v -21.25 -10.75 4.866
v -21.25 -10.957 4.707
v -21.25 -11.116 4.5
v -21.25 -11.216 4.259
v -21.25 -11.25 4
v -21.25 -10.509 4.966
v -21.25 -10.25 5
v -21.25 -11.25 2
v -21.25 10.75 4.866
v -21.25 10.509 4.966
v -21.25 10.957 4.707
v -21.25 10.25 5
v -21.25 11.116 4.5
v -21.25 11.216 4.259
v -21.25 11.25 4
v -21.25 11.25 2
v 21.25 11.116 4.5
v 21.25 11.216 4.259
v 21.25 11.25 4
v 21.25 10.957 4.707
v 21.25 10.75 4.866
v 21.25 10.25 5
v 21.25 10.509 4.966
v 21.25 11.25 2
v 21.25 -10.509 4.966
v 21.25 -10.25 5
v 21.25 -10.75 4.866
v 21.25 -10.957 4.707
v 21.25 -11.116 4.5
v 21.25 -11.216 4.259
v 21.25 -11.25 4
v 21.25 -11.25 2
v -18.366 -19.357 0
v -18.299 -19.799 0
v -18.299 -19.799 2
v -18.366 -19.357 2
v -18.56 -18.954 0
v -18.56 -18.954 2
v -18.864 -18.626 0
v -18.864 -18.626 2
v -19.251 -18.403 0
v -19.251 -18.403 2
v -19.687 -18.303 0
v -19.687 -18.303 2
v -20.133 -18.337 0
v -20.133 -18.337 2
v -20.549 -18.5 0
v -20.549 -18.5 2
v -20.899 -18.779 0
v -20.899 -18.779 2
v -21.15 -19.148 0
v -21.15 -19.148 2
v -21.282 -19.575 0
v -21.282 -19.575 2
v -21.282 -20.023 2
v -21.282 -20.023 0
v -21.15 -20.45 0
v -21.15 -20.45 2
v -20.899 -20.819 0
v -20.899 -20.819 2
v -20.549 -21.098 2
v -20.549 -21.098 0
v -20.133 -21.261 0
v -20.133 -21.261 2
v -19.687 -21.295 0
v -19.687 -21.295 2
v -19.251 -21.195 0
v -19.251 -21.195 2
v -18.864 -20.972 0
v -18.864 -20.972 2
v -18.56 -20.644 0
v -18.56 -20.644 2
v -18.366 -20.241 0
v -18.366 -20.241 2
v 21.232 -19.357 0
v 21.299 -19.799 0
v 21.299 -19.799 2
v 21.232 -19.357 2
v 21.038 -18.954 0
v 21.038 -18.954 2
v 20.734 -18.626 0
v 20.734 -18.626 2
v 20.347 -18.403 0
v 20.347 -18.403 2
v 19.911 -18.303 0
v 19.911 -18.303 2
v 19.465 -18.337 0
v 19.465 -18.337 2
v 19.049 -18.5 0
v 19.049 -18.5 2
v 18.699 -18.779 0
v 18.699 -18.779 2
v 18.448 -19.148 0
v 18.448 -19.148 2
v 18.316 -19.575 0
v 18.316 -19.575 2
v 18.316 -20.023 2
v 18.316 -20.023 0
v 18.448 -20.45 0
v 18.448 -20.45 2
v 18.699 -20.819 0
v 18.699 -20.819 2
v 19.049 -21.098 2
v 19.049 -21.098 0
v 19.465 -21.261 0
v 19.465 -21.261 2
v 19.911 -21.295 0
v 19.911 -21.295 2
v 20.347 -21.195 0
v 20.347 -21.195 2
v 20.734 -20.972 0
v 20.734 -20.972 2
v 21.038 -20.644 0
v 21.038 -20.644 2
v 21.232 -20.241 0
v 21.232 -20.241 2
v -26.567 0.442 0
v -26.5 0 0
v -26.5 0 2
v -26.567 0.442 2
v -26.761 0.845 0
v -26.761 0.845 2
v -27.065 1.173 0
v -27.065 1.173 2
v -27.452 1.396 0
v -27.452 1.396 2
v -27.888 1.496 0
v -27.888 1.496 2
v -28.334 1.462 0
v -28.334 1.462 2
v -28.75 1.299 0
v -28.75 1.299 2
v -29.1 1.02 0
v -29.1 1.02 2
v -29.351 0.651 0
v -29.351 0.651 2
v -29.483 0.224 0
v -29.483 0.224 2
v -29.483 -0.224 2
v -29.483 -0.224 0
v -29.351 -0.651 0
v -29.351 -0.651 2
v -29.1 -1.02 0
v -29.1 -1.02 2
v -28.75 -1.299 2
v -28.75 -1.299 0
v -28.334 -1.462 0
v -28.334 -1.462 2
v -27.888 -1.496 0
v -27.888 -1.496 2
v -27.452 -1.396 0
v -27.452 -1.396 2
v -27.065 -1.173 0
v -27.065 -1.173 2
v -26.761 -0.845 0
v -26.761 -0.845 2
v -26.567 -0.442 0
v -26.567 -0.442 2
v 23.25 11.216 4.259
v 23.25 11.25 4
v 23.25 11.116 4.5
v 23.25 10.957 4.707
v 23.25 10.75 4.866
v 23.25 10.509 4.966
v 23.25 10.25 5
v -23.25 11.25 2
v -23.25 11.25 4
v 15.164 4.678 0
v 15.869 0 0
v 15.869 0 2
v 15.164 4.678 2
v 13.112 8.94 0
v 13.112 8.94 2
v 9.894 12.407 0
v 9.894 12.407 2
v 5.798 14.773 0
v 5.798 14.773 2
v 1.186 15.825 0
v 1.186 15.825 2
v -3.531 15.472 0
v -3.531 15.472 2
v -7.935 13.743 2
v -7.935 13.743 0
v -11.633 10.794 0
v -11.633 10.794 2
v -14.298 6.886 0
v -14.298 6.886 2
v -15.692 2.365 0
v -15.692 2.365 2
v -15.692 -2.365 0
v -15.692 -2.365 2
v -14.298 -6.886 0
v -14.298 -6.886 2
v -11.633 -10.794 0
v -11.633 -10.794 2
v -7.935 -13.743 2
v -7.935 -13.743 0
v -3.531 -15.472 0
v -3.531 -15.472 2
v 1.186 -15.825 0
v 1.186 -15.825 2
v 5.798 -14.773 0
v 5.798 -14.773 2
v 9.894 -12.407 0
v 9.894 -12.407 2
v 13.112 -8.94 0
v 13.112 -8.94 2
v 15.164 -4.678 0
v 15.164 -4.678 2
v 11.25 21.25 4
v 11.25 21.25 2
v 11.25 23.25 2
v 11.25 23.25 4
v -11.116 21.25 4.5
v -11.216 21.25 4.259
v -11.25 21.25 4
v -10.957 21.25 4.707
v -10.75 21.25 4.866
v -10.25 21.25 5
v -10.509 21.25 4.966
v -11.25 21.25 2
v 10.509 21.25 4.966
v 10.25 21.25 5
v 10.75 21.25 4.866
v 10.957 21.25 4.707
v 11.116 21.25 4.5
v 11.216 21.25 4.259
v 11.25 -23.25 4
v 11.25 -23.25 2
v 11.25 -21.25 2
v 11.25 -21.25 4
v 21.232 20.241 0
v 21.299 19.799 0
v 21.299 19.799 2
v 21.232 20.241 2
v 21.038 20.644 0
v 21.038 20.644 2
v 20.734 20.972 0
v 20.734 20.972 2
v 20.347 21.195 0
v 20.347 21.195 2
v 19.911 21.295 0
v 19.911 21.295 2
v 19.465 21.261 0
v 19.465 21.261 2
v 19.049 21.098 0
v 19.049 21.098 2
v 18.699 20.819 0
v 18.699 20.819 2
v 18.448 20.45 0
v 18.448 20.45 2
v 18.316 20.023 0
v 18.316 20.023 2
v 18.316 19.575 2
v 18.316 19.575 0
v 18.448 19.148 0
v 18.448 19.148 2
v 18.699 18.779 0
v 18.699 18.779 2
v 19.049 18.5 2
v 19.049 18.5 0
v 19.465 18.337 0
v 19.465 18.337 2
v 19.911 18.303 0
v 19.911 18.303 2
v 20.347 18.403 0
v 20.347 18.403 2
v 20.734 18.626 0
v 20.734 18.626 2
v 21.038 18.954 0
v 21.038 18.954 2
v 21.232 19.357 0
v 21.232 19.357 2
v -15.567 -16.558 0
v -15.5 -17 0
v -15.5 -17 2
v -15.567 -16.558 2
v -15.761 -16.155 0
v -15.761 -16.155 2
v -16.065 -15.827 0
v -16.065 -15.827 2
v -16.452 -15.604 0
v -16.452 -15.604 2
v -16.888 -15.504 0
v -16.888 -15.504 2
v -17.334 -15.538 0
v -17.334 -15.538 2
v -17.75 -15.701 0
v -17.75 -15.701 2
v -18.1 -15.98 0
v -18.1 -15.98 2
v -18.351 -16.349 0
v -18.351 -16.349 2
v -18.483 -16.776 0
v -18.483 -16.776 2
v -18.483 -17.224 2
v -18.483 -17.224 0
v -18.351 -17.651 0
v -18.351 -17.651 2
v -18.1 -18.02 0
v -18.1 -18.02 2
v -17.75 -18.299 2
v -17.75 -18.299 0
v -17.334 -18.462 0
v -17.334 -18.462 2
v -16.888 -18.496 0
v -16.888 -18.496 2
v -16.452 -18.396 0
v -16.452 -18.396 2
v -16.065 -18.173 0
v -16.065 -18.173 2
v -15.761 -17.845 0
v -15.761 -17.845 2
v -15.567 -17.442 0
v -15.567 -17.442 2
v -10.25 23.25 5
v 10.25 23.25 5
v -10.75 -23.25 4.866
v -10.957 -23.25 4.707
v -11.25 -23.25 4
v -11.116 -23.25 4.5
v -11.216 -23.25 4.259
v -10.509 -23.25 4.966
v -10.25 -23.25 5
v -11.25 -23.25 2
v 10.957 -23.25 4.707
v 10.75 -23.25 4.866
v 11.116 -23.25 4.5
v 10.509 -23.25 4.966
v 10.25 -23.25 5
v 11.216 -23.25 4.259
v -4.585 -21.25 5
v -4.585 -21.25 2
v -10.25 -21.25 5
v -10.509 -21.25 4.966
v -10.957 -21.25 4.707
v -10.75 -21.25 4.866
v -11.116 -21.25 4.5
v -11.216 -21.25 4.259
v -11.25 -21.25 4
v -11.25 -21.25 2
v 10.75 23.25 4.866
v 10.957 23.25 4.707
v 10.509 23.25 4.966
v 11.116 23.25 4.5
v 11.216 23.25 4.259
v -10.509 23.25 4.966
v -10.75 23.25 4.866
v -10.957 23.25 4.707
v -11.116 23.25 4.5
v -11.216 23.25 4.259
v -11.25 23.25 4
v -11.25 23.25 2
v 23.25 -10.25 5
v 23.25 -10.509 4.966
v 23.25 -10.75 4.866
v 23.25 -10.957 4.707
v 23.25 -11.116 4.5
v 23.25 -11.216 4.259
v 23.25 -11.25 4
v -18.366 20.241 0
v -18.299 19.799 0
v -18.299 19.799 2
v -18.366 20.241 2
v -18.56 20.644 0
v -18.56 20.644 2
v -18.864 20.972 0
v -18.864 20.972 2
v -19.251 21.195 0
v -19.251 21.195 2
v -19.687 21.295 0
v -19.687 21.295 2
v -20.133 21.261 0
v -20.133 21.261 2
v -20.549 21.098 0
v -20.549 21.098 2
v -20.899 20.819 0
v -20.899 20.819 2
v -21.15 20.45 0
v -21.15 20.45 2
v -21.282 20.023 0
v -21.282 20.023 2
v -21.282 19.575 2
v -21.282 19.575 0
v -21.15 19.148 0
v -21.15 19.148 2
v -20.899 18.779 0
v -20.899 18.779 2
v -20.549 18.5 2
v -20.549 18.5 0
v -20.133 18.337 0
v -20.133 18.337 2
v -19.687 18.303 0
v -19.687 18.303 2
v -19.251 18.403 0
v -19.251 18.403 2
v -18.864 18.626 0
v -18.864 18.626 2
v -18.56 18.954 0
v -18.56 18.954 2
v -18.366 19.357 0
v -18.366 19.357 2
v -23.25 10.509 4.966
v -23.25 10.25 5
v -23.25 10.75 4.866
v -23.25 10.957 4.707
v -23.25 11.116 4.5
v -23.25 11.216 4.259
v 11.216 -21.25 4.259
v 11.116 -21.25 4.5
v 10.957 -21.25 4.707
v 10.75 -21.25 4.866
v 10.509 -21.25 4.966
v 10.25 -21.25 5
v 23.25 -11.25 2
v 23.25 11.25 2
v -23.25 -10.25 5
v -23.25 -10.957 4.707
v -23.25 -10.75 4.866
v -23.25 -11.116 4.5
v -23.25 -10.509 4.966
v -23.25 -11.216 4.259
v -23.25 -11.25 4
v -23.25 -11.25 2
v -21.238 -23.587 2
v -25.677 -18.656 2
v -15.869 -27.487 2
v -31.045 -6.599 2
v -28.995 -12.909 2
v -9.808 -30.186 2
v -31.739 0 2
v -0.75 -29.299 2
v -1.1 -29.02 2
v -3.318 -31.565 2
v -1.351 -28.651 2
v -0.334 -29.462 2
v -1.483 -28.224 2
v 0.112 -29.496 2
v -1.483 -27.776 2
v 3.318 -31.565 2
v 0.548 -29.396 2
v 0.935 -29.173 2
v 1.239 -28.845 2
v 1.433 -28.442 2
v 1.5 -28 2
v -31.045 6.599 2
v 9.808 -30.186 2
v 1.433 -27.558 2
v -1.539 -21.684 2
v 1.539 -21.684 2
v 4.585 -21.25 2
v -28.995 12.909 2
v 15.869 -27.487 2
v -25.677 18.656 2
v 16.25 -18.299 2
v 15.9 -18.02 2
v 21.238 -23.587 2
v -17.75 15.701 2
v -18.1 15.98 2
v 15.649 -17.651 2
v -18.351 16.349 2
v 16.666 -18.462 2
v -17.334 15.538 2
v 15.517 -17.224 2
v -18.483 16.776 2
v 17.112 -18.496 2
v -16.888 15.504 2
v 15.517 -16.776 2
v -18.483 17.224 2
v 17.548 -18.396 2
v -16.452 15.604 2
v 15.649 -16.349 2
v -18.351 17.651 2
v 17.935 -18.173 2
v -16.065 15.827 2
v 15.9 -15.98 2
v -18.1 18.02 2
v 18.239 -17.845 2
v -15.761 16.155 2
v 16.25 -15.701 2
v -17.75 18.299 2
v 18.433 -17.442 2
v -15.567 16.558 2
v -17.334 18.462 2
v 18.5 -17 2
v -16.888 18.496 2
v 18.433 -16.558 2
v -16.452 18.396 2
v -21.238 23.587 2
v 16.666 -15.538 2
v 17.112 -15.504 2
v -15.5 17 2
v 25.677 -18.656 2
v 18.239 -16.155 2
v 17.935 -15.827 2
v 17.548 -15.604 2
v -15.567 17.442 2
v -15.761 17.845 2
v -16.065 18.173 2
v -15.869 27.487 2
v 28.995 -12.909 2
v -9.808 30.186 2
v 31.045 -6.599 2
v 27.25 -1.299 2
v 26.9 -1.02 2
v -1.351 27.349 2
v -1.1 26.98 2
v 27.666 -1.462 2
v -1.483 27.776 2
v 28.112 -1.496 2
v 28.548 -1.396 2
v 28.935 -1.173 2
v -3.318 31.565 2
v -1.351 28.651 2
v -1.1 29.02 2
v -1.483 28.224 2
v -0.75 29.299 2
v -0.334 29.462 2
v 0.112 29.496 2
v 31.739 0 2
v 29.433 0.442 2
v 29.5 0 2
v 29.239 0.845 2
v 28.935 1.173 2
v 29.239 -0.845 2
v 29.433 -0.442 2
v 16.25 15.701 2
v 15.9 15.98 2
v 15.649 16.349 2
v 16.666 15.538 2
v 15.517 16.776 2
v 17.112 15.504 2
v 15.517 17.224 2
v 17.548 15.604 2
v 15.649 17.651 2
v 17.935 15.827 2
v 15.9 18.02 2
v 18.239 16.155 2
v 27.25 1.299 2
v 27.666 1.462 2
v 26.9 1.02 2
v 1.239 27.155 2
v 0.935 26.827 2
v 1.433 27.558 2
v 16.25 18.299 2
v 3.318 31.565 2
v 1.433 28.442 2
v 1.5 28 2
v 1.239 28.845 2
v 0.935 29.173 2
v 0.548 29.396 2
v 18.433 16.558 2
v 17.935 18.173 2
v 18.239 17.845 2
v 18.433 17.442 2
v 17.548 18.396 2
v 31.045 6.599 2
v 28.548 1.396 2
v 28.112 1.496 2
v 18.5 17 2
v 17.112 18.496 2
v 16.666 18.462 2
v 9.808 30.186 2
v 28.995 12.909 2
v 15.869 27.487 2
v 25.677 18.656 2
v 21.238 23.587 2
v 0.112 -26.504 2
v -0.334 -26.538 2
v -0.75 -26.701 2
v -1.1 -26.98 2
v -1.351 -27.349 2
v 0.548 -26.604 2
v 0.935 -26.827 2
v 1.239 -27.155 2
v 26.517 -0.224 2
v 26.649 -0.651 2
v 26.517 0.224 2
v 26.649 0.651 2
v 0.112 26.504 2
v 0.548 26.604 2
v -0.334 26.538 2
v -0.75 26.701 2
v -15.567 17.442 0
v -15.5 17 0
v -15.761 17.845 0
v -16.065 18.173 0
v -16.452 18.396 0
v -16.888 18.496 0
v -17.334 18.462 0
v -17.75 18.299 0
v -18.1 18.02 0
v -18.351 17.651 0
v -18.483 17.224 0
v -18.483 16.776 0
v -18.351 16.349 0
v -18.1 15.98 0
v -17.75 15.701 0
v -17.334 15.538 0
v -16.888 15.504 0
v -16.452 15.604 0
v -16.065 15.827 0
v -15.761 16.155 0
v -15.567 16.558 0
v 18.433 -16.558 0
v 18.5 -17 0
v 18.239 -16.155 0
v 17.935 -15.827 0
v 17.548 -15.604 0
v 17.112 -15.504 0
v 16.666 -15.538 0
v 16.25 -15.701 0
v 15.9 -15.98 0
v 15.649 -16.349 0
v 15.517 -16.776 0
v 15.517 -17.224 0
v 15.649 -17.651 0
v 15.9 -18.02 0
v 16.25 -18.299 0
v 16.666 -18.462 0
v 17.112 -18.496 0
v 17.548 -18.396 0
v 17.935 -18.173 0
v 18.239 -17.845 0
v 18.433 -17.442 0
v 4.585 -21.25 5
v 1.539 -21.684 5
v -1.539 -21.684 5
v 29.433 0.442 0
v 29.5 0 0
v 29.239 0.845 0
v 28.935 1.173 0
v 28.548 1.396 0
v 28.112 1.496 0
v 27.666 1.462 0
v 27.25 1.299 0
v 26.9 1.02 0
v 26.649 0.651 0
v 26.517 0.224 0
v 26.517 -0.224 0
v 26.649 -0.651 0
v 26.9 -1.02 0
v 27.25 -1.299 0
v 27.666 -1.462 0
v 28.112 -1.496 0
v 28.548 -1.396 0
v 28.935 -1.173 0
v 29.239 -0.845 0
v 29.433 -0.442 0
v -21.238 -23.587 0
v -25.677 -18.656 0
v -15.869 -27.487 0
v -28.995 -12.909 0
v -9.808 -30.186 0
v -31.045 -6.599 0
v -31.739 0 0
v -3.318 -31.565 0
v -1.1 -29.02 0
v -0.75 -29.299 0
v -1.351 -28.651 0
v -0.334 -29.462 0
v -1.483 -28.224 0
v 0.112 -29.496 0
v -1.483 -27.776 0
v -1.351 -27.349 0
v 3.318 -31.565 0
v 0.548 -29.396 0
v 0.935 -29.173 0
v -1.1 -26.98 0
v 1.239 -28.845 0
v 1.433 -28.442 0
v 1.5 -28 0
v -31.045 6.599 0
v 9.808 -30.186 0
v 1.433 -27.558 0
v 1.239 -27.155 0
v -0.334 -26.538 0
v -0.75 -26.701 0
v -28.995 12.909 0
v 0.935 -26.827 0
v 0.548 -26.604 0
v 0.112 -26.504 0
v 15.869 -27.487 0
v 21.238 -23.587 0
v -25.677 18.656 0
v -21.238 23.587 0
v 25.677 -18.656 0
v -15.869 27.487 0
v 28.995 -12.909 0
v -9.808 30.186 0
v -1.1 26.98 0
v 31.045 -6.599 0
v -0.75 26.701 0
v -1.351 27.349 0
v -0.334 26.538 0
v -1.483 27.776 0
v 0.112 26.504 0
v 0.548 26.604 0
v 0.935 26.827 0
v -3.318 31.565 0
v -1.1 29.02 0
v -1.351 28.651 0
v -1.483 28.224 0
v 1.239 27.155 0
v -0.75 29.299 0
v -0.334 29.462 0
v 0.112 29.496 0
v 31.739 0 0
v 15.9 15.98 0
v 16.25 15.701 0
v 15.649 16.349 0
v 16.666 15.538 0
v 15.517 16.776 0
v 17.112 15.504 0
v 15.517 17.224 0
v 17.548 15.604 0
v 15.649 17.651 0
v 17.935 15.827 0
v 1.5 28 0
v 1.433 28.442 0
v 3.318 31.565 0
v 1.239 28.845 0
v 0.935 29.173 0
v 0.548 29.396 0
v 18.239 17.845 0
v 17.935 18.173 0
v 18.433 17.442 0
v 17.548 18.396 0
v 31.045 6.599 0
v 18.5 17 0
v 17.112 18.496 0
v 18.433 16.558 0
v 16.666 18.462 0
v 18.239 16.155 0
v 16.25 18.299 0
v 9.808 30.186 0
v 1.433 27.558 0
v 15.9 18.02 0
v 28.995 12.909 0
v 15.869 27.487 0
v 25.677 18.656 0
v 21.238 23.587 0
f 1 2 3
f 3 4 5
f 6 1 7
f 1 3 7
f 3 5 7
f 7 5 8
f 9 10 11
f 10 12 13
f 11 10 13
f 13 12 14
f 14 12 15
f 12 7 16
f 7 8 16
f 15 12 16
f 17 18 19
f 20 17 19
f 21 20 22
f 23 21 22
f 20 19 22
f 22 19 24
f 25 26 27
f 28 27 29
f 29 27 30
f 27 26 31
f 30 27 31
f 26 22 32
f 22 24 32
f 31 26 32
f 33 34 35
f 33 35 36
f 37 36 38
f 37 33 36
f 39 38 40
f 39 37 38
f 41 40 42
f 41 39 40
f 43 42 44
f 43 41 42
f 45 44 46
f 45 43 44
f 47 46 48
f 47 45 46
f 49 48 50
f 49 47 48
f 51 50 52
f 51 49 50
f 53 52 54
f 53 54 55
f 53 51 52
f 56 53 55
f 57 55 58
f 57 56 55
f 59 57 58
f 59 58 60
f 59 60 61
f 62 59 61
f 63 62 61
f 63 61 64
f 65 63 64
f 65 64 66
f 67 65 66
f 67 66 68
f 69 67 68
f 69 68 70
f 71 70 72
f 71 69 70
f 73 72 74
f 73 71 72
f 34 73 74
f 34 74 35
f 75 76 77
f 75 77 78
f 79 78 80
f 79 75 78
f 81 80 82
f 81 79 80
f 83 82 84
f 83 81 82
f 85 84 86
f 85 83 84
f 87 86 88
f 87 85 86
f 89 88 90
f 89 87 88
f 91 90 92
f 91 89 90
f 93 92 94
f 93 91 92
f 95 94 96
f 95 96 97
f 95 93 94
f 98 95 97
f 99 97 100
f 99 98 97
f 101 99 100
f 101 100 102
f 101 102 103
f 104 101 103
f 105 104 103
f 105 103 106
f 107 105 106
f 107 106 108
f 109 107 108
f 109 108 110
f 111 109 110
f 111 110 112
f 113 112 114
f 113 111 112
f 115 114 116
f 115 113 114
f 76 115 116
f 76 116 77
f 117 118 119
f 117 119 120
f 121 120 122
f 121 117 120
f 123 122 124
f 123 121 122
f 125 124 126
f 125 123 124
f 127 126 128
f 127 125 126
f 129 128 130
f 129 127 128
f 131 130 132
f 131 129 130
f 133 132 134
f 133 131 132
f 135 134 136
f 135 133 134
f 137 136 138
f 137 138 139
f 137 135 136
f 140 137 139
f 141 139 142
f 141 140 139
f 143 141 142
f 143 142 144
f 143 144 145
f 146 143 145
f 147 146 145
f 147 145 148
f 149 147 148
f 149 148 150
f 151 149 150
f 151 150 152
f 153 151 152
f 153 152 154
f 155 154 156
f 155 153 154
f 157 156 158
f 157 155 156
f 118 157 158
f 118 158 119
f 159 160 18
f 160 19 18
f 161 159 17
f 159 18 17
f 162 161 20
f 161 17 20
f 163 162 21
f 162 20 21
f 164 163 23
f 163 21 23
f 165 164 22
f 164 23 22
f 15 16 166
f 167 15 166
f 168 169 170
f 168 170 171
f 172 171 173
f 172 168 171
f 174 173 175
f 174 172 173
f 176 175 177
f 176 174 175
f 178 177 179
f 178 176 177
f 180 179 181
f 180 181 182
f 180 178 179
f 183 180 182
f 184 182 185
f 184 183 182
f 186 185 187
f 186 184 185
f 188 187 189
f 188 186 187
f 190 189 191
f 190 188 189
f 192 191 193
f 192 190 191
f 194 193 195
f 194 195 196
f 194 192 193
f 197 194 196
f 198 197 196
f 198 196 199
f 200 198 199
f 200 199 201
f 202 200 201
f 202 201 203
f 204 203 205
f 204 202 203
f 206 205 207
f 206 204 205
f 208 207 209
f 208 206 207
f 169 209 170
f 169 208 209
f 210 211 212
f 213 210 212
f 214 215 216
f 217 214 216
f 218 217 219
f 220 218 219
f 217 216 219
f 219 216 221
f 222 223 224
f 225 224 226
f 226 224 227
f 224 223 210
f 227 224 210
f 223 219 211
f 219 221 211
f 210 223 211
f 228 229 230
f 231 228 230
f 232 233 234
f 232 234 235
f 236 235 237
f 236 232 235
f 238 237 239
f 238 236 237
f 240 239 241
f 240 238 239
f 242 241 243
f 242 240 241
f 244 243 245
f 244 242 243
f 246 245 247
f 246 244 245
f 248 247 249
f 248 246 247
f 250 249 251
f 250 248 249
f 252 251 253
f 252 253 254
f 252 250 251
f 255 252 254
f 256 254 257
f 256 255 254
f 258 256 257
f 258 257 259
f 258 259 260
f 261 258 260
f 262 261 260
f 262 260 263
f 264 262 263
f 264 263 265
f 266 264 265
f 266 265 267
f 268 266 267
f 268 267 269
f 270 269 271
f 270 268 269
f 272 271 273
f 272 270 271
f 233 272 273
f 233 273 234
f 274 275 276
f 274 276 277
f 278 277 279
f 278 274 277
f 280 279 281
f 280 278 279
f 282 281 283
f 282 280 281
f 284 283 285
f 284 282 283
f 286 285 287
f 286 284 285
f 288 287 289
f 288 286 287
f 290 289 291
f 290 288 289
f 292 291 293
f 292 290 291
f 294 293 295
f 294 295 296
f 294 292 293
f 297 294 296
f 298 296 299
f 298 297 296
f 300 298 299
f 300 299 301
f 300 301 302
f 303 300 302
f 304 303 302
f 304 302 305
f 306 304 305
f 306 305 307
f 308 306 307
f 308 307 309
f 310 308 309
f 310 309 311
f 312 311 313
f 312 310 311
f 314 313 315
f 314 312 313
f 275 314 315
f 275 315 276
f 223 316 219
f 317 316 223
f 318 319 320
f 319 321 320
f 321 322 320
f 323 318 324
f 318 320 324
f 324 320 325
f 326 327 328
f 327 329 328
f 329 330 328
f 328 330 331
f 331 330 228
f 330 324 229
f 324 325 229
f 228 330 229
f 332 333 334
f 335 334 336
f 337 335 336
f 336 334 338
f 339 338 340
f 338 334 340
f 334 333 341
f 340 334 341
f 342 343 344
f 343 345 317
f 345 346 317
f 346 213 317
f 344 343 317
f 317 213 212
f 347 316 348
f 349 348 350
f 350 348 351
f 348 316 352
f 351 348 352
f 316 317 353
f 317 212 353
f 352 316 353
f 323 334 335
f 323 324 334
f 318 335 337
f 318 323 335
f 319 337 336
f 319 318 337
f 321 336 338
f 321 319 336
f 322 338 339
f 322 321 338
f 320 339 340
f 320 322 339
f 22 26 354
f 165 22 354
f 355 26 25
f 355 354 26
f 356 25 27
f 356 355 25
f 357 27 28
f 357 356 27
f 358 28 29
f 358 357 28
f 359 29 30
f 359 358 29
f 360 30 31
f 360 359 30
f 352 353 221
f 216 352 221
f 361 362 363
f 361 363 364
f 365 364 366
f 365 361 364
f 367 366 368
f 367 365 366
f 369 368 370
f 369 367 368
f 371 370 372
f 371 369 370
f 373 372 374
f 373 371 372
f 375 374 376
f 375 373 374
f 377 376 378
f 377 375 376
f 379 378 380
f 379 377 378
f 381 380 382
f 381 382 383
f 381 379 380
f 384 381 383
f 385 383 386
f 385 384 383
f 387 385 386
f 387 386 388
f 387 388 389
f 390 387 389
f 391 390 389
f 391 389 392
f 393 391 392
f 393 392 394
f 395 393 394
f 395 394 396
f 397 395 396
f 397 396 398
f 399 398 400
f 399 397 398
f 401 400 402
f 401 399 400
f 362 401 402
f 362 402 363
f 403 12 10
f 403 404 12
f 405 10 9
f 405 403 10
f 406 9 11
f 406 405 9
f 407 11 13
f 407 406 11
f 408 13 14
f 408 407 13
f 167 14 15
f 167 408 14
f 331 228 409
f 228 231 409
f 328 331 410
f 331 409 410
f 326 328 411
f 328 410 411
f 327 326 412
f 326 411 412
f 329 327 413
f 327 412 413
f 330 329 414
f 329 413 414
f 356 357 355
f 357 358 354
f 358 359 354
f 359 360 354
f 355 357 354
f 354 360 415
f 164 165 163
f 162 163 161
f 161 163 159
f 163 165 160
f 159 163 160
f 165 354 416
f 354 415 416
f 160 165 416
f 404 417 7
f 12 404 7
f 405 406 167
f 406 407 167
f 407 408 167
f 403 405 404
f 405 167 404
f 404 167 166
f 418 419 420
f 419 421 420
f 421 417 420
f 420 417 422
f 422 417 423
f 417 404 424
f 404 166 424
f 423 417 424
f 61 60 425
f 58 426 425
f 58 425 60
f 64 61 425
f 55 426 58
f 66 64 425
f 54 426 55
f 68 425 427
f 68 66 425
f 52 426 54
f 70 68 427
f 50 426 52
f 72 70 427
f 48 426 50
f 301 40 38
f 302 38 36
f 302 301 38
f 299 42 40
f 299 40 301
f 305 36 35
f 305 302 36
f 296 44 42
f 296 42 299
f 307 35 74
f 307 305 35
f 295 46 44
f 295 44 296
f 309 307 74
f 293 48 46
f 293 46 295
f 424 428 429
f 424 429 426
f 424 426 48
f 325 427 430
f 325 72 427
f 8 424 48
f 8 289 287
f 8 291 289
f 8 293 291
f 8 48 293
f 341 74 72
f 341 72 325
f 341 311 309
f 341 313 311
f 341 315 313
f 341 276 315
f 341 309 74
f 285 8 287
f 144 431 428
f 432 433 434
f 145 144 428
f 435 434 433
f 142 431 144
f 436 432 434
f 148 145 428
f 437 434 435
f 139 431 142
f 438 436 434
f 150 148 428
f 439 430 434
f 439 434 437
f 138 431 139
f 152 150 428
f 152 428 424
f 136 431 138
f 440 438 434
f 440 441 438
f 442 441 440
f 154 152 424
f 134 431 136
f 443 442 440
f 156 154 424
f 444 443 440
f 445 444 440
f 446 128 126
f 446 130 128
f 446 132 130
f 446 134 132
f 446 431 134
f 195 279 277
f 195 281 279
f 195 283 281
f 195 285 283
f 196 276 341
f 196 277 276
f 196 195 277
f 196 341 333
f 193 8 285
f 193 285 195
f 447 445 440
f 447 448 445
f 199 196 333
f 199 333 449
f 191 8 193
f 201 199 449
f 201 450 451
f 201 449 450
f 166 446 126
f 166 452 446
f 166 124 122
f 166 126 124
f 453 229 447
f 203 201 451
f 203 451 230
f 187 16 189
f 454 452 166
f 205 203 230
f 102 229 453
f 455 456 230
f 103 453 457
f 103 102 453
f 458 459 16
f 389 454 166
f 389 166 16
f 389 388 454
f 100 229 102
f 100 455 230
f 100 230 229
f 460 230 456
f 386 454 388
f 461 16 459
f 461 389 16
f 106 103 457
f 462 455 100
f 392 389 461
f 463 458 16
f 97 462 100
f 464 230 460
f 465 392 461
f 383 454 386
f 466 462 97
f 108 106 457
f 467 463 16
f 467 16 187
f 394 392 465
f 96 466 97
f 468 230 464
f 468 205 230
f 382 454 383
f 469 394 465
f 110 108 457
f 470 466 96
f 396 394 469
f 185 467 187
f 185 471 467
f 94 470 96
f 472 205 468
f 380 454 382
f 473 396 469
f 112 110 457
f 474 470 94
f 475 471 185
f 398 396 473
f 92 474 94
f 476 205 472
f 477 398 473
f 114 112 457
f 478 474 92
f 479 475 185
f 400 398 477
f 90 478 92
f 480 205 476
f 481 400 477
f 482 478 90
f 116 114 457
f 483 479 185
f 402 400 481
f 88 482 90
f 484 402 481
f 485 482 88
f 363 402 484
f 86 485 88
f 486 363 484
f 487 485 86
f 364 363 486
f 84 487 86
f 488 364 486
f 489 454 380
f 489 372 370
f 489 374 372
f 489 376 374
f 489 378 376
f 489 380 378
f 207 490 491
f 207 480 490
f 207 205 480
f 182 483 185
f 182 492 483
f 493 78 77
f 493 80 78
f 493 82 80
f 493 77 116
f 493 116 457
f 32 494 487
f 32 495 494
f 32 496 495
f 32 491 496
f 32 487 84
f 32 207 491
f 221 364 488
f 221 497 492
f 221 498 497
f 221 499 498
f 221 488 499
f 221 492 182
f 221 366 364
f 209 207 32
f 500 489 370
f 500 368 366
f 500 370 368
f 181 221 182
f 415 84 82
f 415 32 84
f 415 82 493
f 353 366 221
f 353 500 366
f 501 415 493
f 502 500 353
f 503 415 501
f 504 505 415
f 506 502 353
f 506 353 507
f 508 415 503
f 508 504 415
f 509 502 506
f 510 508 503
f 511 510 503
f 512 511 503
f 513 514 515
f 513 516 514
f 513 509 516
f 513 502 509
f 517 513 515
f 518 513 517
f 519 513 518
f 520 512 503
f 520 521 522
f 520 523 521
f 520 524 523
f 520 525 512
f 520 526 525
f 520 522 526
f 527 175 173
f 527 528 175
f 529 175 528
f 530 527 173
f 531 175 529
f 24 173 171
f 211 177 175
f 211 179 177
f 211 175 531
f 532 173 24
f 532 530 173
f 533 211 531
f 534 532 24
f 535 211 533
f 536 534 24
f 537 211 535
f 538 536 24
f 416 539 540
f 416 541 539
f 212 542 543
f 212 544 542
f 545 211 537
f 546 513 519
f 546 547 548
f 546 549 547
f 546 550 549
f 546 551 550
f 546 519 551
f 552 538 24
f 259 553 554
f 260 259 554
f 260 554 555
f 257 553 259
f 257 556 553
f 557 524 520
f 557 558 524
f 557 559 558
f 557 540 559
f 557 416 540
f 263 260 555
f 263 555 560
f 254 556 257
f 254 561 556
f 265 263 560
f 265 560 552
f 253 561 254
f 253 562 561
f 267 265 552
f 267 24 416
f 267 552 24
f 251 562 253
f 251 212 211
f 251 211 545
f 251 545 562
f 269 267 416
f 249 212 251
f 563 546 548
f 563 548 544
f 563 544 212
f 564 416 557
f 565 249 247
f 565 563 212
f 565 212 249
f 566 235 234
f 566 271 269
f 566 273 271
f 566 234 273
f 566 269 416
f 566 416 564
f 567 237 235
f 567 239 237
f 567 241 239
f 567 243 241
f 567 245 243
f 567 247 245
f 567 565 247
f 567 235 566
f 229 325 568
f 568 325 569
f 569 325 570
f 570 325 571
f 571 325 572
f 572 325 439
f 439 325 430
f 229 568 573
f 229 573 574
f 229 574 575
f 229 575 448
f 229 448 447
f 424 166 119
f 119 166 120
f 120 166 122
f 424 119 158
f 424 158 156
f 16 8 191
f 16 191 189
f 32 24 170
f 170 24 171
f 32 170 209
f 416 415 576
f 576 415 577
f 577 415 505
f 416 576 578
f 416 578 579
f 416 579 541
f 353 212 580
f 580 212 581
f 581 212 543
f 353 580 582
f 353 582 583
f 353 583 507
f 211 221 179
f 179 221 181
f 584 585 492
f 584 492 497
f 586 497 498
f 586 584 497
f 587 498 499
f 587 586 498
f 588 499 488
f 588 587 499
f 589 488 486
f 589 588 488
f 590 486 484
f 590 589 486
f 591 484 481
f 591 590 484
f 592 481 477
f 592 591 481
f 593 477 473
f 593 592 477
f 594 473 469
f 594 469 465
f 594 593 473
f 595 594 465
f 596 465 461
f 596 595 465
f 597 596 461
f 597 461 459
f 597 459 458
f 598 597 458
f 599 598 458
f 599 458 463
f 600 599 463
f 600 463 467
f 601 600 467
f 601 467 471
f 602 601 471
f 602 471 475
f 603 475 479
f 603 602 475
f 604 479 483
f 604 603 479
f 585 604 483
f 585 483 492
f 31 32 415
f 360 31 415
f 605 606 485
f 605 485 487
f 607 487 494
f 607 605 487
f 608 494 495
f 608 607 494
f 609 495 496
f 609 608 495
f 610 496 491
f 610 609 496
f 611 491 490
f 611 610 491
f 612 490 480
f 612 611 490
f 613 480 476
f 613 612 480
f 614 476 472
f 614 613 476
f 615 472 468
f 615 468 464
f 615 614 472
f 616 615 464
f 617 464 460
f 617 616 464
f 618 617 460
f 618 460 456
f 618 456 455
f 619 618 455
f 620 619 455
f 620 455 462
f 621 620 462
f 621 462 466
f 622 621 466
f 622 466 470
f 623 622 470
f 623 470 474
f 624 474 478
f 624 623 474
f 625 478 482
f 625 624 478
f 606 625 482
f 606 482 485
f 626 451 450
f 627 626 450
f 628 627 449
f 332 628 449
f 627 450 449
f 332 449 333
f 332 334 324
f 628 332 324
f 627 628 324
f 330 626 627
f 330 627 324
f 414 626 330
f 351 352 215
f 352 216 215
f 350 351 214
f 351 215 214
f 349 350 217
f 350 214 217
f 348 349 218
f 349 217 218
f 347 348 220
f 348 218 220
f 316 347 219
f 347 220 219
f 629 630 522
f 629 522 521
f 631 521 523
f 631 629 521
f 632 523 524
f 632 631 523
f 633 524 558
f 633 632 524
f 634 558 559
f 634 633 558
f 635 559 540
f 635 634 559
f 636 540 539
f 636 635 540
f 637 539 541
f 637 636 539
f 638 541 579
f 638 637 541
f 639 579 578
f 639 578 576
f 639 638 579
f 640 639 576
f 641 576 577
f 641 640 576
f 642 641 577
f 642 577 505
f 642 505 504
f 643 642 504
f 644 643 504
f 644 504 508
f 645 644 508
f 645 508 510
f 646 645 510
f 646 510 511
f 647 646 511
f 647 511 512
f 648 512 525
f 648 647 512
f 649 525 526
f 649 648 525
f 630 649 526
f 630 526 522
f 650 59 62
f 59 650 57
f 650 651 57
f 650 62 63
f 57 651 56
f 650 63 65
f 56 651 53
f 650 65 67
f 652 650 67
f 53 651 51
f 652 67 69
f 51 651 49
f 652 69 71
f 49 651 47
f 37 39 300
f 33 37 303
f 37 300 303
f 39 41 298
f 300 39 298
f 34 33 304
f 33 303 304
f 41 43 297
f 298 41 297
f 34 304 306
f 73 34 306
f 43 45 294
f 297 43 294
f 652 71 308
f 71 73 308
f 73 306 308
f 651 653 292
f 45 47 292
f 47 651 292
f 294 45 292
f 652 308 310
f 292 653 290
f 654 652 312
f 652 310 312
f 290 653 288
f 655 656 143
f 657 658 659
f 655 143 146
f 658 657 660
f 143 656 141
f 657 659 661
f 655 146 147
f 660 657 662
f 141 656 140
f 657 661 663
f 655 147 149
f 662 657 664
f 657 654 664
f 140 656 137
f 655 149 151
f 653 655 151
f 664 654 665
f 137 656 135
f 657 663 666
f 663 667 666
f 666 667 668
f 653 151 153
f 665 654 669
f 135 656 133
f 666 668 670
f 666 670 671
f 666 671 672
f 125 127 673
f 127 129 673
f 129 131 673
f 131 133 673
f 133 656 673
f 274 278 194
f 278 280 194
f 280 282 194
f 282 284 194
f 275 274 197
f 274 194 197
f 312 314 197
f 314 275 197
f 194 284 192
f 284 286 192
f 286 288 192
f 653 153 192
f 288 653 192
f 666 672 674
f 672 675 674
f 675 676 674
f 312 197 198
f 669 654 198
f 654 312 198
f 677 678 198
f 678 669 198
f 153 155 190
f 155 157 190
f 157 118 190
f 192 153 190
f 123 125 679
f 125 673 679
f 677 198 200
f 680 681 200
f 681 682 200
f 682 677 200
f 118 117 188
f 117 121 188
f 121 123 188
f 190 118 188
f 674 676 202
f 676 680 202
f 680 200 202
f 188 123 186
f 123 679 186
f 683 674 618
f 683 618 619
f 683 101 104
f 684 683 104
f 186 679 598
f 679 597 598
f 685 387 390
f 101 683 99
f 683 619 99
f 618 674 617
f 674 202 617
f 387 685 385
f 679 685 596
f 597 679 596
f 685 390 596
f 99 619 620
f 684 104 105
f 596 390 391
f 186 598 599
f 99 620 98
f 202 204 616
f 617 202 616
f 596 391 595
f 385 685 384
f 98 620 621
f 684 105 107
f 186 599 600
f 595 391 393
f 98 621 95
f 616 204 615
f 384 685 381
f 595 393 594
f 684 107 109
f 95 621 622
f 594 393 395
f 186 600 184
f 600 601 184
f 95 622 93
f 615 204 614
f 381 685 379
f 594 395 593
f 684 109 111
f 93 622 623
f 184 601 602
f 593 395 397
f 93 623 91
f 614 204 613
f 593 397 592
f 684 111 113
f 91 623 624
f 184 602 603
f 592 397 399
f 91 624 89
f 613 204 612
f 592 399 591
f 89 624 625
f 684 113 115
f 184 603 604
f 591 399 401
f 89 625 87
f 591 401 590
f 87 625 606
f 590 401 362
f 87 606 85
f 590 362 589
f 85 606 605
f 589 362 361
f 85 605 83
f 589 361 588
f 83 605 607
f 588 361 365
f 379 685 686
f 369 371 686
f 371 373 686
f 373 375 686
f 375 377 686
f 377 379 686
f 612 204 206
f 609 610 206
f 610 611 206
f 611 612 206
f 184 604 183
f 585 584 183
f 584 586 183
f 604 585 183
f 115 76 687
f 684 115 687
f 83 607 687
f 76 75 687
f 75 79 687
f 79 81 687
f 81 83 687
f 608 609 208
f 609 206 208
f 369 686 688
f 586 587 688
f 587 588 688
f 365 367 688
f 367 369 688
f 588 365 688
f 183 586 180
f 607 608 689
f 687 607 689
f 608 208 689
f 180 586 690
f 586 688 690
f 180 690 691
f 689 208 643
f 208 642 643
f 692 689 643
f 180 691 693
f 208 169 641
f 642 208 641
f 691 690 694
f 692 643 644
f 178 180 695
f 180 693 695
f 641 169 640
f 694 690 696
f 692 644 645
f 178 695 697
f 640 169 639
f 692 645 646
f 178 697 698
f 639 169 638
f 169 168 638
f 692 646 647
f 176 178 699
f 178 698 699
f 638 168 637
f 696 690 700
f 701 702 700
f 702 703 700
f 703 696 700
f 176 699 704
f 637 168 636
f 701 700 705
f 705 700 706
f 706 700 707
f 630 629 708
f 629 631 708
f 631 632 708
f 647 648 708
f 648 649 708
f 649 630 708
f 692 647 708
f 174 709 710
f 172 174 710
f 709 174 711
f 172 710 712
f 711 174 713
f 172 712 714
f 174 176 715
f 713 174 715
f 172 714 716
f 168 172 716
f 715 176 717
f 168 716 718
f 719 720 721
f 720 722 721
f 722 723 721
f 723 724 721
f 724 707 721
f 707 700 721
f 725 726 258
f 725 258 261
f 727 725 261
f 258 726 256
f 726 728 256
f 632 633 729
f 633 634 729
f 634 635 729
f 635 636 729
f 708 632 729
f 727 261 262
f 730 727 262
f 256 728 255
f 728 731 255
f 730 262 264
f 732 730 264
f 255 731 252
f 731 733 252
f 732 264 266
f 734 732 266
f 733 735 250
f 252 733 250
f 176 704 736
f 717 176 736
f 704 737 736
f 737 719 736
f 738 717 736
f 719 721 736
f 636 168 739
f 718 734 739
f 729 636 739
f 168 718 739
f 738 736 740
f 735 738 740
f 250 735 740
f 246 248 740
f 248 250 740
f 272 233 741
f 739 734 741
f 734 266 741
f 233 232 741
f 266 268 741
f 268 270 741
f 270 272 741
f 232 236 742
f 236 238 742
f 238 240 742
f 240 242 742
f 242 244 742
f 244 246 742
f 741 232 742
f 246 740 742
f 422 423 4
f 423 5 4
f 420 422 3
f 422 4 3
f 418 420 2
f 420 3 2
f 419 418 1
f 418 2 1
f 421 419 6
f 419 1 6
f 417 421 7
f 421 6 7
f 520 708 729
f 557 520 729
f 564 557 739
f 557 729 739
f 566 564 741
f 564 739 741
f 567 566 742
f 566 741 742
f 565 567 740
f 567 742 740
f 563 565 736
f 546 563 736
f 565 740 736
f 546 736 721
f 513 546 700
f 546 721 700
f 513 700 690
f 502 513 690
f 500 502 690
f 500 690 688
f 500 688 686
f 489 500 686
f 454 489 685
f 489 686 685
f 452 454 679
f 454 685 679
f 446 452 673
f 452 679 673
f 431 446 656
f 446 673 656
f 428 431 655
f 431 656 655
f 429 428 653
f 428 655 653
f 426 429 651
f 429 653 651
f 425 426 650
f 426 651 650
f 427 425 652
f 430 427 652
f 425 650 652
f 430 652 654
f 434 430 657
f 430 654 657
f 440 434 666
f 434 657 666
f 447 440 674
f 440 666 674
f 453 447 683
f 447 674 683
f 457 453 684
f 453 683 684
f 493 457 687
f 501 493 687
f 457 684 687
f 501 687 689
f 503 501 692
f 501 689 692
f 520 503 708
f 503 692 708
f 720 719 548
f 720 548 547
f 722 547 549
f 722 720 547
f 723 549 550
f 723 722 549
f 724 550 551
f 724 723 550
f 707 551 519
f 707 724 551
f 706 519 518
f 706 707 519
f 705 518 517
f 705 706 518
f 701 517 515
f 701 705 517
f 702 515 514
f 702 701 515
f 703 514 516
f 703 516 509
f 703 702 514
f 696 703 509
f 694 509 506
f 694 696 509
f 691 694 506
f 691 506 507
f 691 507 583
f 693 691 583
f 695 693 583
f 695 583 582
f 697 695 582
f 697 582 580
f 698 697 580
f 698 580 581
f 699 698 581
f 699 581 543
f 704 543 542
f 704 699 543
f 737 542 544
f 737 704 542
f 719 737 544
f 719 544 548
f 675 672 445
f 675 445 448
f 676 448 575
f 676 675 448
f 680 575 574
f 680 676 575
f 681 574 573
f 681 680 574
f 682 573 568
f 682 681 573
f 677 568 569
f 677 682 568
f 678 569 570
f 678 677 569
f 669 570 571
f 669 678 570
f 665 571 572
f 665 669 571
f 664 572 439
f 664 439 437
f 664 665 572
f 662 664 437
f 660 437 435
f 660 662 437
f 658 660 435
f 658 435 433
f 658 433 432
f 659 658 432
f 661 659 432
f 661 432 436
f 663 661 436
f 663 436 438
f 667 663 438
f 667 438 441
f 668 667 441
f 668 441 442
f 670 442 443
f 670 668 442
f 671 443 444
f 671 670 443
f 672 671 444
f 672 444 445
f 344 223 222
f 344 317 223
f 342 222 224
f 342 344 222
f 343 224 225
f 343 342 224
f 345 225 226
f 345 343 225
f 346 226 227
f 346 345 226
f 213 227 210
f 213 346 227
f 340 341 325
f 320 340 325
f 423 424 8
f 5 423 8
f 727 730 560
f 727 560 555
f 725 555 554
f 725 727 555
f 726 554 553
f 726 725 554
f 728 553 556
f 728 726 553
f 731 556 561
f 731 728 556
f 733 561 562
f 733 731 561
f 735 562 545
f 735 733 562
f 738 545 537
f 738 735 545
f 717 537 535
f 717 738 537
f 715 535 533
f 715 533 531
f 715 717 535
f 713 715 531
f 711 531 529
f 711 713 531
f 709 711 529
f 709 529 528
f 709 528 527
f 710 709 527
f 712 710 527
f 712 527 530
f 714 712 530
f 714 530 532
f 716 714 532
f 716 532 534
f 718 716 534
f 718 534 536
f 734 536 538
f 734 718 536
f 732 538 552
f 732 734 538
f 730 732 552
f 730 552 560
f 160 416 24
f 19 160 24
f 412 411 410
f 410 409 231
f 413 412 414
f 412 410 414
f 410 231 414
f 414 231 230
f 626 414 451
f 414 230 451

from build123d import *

# Parameters (mm, degrees)
SKETCH_1_R      = 31.73899895
SKETCH_1_R_2    = 15.869499475
SKETCH_1_R_3    = 1.5
EXTRUDE_2_DEPTH = 2
EXTRUDE_3_DEPTH = 3
FILLET_1_R      = 1
FILLET_2_R      = 1
FILLET_3_R      = 1
FILLET_4_R      = 1
FILLET_5_R      = 1
FILLET_6_R      = 1
FILLET_7_R      = 1
FILLET_8_R      = 1


with BuildPart() as part:
    # 草图1 → 凸台-拉伸2 (new body)
    with BuildSketch(Plane.XY):
        Circle(SKETCH_1_R)
        Circle(SKETCH_1_R_2, mode=Mode.SUBTRACT)
        with Locations((-17, 17)):
            Circle(SKETCH_1_R_3, mode=Mode.SUBTRACT)
        with Locations((17, 17)):
            Circle(SKETCH_1_R_3, mode=Mode.SUBTRACT)
        with Locations((17, -17)):
            Circle(SKETCH_1_R_3, mode=Mode.SUBTRACT)
        with Locations((-17, -17)):
            Circle(SKETCH_1_R_3, mode=Mode.SUBTRACT)
        with Locations((-19.798989873, 19.798989873)):
            Circle(SKETCH_1_R_3, mode=Mode.SUBTRACT)
        with Locations((0, 28)):
            Circle(SKETCH_1_R_3, mode=Mode.SUBTRACT)
        with Locations((19.798989873, 19.798989873)):
            Circle(SKETCH_1_R_3, mode=Mode.SUBTRACT)
        with Locations((28, 0)):
            Circle(SKETCH_1_R_3, mode=Mode.SUBTRACT)
        with Locations((19.798989873, -19.798989873)):
            Circle(SKETCH_1_R_3, mode=Mode.SUBTRACT)
        with Locations((0, -28)):
            Circle(SKETCH_1_R_3, mode=Mode.SUBTRACT)
        with Locations((-19.798989873, -19.798989873)):
            Circle(SKETCH_1_R_3, mode=Mode.SUBTRACT)
        with Locations((-28, 0)):
            Circle(SKETCH_1_R_3, mode=Mode.SUBTRACT)
    extrude(amount=EXTRUDE_2_DEPTH)

    # 草图2 → 凸台-拉伸3 (add)
    with BuildSketch(Plane.XY.offset(2)):
        with BuildLine():
            Line((11.25, 23.25), (-11.25, 23.25))
            Line((-11.25, 23.25), (-11.25, 21.25))
            Line((-11.25, 21.25), (-4.584929155, 21.25))
            ThreePointArc((-4.584929155, 21.25), (0, 21.73899895), (4.584929155, 21.25))
            Line((4.584929155, 21.25), (11.25, 21.25))
            Line((11.25, 21.25), (11.25, 23.25))
        make_face()
        with BuildLine():
            Line((-23.25, 11.25), (-23.25, -11.25))
            Line((-23.25, -11.25), (-21.25, -11.25))
            Line((-21.25, -11.25), (-21.25, -4.584929155))
            ThreePointArc((-21.25, -4.584929155), (-21.73899895, 0), (-21.25, 4.584929155))
            Line((-21.25, 4.584929155), (-21.25, 11.25))
            Line((-21.25, 11.25), (-23.25, 11.25))
        make_face()
        with BuildLine():
            Line((21.25, -11.25), (23.25, -11.25))
            Line((23.25, -11.25), (23.25, 11.25))
            Line((23.25, 11.25), (21.25, 11.25))
            Line((21.25, 11.25), (21.25, 4.584929155))
            ThreePointArc((21.25, 4.584929155), (21.616403529, 2.305466077), (21.73899895, 0))
            ThreePointArc((21.73899895, 0), (21.616403529, -2.305466077), (21.25, -4.584929155))
            Line((21.25, -4.584929155), (21.25, -11.25))
        make_face()
        with BuildLine():
            Line((-11.25, -21.25), (-11.25, -23.25))
            Line((-11.25, -23.25), (11.25, -23.25))
            Line((11.25, -23.25), (11.25, -21.25))
            Line((11.25, -21.25), (4.584929155, -21.25))
            ThreePointArc((4.584929155, -21.25), (0, -21.73899895), (-4.584929155, -21.25))
            Line((-4.584929155, -21.25), (-11.25, -21.25))
        make_face()
        with BuildLine():
            ThreePointArc((-21.25, 4.584929155), (-21.73899895, 0), (-21.25, -4.584929155))
            Line((-21.25, -4.584929155), (-21.25, 4.584929155))
        make_face()
        with BuildLine():
            ThreePointArc((4.584929155, 21.25), (0, 21.73899895), (-4.584929155, 21.25))
            Line((-4.584929155, 21.25), (4.584929155, 21.25))
        make_face()
        with BuildLine():
            Line((21.25, 4.584929155), (21.25, -4.584929155))
            ThreePointArc((21.25, -4.584929155), (21.616403529, -2.305466077), (21.73899895, 0))
            ThreePointArc((21.73899895, 0), (21.616403529, 2.305466077), (21.25, 4.584929155))
        make_face()
    extrude(amount=EXTRUDE_3_DEPTH)

    # 圆角1
    fillet_1_edges = [part.edges().sort_by_distance(p)[0] for p in [
        (-22.25, -11.25, 5),
    ]]
    fillet(fillet_1_edges, radius=FILLET_1_R)

    # 圆角2
    fillet_2_edges = [part.edges().sort_by_distance(p)[0] for p in [
        (-22.25, 11.25, 5),
    ]]
    fillet(fillet_2_edges, radius=FILLET_2_R)

    # 圆角3
    fillet_3_edges = [part.edges().sort_by_distance(p)[0] for p in [
        (-11.25, 22.25, 5),
    ]]
    fillet(fillet_3_edges, radius=FILLET_3_R)

    # 圆角4
    fillet_4_edges = [part.edges().sort_by_distance(p)[0] for p in [
        (11.25, 22.25, 5),
    ]]
    fillet(fillet_4_edges, radius=FILLET_4_R)

    # 圆角5
    fillet_5_edges = [part.edges().sort_by_distance(p)[0] for p in [
        (22.25, 11.25, 5),
    ]]
    fillet(fillet_5_edges, radius=FILLET_5_R)

    # 圆角6
    fillet_6_edges = [part.edges().sort_by_distance(p)[0] for p in [
        (22.25, -11.25, 5),
    ]]
    fillet(fillet_6_edges, radius=FILLET_6_R)

    # 圆角7
    fillet_7_edges = [part.edges().sort_by_distance(p)[0] for p in [
        (11.25, -22.25, 5),
    ]]
    fillet(fillet_7_edges, radius=FILLET_7_R)

    # 圆角8
    fillet_8_edges = [part.edges().sort_by_distance(p)[0] for p in [
        (-11.25, -22.25, 5),
    ]]
    fillet(fillet_8_edges, radius=FILLET_8_R)


solid = part.part
